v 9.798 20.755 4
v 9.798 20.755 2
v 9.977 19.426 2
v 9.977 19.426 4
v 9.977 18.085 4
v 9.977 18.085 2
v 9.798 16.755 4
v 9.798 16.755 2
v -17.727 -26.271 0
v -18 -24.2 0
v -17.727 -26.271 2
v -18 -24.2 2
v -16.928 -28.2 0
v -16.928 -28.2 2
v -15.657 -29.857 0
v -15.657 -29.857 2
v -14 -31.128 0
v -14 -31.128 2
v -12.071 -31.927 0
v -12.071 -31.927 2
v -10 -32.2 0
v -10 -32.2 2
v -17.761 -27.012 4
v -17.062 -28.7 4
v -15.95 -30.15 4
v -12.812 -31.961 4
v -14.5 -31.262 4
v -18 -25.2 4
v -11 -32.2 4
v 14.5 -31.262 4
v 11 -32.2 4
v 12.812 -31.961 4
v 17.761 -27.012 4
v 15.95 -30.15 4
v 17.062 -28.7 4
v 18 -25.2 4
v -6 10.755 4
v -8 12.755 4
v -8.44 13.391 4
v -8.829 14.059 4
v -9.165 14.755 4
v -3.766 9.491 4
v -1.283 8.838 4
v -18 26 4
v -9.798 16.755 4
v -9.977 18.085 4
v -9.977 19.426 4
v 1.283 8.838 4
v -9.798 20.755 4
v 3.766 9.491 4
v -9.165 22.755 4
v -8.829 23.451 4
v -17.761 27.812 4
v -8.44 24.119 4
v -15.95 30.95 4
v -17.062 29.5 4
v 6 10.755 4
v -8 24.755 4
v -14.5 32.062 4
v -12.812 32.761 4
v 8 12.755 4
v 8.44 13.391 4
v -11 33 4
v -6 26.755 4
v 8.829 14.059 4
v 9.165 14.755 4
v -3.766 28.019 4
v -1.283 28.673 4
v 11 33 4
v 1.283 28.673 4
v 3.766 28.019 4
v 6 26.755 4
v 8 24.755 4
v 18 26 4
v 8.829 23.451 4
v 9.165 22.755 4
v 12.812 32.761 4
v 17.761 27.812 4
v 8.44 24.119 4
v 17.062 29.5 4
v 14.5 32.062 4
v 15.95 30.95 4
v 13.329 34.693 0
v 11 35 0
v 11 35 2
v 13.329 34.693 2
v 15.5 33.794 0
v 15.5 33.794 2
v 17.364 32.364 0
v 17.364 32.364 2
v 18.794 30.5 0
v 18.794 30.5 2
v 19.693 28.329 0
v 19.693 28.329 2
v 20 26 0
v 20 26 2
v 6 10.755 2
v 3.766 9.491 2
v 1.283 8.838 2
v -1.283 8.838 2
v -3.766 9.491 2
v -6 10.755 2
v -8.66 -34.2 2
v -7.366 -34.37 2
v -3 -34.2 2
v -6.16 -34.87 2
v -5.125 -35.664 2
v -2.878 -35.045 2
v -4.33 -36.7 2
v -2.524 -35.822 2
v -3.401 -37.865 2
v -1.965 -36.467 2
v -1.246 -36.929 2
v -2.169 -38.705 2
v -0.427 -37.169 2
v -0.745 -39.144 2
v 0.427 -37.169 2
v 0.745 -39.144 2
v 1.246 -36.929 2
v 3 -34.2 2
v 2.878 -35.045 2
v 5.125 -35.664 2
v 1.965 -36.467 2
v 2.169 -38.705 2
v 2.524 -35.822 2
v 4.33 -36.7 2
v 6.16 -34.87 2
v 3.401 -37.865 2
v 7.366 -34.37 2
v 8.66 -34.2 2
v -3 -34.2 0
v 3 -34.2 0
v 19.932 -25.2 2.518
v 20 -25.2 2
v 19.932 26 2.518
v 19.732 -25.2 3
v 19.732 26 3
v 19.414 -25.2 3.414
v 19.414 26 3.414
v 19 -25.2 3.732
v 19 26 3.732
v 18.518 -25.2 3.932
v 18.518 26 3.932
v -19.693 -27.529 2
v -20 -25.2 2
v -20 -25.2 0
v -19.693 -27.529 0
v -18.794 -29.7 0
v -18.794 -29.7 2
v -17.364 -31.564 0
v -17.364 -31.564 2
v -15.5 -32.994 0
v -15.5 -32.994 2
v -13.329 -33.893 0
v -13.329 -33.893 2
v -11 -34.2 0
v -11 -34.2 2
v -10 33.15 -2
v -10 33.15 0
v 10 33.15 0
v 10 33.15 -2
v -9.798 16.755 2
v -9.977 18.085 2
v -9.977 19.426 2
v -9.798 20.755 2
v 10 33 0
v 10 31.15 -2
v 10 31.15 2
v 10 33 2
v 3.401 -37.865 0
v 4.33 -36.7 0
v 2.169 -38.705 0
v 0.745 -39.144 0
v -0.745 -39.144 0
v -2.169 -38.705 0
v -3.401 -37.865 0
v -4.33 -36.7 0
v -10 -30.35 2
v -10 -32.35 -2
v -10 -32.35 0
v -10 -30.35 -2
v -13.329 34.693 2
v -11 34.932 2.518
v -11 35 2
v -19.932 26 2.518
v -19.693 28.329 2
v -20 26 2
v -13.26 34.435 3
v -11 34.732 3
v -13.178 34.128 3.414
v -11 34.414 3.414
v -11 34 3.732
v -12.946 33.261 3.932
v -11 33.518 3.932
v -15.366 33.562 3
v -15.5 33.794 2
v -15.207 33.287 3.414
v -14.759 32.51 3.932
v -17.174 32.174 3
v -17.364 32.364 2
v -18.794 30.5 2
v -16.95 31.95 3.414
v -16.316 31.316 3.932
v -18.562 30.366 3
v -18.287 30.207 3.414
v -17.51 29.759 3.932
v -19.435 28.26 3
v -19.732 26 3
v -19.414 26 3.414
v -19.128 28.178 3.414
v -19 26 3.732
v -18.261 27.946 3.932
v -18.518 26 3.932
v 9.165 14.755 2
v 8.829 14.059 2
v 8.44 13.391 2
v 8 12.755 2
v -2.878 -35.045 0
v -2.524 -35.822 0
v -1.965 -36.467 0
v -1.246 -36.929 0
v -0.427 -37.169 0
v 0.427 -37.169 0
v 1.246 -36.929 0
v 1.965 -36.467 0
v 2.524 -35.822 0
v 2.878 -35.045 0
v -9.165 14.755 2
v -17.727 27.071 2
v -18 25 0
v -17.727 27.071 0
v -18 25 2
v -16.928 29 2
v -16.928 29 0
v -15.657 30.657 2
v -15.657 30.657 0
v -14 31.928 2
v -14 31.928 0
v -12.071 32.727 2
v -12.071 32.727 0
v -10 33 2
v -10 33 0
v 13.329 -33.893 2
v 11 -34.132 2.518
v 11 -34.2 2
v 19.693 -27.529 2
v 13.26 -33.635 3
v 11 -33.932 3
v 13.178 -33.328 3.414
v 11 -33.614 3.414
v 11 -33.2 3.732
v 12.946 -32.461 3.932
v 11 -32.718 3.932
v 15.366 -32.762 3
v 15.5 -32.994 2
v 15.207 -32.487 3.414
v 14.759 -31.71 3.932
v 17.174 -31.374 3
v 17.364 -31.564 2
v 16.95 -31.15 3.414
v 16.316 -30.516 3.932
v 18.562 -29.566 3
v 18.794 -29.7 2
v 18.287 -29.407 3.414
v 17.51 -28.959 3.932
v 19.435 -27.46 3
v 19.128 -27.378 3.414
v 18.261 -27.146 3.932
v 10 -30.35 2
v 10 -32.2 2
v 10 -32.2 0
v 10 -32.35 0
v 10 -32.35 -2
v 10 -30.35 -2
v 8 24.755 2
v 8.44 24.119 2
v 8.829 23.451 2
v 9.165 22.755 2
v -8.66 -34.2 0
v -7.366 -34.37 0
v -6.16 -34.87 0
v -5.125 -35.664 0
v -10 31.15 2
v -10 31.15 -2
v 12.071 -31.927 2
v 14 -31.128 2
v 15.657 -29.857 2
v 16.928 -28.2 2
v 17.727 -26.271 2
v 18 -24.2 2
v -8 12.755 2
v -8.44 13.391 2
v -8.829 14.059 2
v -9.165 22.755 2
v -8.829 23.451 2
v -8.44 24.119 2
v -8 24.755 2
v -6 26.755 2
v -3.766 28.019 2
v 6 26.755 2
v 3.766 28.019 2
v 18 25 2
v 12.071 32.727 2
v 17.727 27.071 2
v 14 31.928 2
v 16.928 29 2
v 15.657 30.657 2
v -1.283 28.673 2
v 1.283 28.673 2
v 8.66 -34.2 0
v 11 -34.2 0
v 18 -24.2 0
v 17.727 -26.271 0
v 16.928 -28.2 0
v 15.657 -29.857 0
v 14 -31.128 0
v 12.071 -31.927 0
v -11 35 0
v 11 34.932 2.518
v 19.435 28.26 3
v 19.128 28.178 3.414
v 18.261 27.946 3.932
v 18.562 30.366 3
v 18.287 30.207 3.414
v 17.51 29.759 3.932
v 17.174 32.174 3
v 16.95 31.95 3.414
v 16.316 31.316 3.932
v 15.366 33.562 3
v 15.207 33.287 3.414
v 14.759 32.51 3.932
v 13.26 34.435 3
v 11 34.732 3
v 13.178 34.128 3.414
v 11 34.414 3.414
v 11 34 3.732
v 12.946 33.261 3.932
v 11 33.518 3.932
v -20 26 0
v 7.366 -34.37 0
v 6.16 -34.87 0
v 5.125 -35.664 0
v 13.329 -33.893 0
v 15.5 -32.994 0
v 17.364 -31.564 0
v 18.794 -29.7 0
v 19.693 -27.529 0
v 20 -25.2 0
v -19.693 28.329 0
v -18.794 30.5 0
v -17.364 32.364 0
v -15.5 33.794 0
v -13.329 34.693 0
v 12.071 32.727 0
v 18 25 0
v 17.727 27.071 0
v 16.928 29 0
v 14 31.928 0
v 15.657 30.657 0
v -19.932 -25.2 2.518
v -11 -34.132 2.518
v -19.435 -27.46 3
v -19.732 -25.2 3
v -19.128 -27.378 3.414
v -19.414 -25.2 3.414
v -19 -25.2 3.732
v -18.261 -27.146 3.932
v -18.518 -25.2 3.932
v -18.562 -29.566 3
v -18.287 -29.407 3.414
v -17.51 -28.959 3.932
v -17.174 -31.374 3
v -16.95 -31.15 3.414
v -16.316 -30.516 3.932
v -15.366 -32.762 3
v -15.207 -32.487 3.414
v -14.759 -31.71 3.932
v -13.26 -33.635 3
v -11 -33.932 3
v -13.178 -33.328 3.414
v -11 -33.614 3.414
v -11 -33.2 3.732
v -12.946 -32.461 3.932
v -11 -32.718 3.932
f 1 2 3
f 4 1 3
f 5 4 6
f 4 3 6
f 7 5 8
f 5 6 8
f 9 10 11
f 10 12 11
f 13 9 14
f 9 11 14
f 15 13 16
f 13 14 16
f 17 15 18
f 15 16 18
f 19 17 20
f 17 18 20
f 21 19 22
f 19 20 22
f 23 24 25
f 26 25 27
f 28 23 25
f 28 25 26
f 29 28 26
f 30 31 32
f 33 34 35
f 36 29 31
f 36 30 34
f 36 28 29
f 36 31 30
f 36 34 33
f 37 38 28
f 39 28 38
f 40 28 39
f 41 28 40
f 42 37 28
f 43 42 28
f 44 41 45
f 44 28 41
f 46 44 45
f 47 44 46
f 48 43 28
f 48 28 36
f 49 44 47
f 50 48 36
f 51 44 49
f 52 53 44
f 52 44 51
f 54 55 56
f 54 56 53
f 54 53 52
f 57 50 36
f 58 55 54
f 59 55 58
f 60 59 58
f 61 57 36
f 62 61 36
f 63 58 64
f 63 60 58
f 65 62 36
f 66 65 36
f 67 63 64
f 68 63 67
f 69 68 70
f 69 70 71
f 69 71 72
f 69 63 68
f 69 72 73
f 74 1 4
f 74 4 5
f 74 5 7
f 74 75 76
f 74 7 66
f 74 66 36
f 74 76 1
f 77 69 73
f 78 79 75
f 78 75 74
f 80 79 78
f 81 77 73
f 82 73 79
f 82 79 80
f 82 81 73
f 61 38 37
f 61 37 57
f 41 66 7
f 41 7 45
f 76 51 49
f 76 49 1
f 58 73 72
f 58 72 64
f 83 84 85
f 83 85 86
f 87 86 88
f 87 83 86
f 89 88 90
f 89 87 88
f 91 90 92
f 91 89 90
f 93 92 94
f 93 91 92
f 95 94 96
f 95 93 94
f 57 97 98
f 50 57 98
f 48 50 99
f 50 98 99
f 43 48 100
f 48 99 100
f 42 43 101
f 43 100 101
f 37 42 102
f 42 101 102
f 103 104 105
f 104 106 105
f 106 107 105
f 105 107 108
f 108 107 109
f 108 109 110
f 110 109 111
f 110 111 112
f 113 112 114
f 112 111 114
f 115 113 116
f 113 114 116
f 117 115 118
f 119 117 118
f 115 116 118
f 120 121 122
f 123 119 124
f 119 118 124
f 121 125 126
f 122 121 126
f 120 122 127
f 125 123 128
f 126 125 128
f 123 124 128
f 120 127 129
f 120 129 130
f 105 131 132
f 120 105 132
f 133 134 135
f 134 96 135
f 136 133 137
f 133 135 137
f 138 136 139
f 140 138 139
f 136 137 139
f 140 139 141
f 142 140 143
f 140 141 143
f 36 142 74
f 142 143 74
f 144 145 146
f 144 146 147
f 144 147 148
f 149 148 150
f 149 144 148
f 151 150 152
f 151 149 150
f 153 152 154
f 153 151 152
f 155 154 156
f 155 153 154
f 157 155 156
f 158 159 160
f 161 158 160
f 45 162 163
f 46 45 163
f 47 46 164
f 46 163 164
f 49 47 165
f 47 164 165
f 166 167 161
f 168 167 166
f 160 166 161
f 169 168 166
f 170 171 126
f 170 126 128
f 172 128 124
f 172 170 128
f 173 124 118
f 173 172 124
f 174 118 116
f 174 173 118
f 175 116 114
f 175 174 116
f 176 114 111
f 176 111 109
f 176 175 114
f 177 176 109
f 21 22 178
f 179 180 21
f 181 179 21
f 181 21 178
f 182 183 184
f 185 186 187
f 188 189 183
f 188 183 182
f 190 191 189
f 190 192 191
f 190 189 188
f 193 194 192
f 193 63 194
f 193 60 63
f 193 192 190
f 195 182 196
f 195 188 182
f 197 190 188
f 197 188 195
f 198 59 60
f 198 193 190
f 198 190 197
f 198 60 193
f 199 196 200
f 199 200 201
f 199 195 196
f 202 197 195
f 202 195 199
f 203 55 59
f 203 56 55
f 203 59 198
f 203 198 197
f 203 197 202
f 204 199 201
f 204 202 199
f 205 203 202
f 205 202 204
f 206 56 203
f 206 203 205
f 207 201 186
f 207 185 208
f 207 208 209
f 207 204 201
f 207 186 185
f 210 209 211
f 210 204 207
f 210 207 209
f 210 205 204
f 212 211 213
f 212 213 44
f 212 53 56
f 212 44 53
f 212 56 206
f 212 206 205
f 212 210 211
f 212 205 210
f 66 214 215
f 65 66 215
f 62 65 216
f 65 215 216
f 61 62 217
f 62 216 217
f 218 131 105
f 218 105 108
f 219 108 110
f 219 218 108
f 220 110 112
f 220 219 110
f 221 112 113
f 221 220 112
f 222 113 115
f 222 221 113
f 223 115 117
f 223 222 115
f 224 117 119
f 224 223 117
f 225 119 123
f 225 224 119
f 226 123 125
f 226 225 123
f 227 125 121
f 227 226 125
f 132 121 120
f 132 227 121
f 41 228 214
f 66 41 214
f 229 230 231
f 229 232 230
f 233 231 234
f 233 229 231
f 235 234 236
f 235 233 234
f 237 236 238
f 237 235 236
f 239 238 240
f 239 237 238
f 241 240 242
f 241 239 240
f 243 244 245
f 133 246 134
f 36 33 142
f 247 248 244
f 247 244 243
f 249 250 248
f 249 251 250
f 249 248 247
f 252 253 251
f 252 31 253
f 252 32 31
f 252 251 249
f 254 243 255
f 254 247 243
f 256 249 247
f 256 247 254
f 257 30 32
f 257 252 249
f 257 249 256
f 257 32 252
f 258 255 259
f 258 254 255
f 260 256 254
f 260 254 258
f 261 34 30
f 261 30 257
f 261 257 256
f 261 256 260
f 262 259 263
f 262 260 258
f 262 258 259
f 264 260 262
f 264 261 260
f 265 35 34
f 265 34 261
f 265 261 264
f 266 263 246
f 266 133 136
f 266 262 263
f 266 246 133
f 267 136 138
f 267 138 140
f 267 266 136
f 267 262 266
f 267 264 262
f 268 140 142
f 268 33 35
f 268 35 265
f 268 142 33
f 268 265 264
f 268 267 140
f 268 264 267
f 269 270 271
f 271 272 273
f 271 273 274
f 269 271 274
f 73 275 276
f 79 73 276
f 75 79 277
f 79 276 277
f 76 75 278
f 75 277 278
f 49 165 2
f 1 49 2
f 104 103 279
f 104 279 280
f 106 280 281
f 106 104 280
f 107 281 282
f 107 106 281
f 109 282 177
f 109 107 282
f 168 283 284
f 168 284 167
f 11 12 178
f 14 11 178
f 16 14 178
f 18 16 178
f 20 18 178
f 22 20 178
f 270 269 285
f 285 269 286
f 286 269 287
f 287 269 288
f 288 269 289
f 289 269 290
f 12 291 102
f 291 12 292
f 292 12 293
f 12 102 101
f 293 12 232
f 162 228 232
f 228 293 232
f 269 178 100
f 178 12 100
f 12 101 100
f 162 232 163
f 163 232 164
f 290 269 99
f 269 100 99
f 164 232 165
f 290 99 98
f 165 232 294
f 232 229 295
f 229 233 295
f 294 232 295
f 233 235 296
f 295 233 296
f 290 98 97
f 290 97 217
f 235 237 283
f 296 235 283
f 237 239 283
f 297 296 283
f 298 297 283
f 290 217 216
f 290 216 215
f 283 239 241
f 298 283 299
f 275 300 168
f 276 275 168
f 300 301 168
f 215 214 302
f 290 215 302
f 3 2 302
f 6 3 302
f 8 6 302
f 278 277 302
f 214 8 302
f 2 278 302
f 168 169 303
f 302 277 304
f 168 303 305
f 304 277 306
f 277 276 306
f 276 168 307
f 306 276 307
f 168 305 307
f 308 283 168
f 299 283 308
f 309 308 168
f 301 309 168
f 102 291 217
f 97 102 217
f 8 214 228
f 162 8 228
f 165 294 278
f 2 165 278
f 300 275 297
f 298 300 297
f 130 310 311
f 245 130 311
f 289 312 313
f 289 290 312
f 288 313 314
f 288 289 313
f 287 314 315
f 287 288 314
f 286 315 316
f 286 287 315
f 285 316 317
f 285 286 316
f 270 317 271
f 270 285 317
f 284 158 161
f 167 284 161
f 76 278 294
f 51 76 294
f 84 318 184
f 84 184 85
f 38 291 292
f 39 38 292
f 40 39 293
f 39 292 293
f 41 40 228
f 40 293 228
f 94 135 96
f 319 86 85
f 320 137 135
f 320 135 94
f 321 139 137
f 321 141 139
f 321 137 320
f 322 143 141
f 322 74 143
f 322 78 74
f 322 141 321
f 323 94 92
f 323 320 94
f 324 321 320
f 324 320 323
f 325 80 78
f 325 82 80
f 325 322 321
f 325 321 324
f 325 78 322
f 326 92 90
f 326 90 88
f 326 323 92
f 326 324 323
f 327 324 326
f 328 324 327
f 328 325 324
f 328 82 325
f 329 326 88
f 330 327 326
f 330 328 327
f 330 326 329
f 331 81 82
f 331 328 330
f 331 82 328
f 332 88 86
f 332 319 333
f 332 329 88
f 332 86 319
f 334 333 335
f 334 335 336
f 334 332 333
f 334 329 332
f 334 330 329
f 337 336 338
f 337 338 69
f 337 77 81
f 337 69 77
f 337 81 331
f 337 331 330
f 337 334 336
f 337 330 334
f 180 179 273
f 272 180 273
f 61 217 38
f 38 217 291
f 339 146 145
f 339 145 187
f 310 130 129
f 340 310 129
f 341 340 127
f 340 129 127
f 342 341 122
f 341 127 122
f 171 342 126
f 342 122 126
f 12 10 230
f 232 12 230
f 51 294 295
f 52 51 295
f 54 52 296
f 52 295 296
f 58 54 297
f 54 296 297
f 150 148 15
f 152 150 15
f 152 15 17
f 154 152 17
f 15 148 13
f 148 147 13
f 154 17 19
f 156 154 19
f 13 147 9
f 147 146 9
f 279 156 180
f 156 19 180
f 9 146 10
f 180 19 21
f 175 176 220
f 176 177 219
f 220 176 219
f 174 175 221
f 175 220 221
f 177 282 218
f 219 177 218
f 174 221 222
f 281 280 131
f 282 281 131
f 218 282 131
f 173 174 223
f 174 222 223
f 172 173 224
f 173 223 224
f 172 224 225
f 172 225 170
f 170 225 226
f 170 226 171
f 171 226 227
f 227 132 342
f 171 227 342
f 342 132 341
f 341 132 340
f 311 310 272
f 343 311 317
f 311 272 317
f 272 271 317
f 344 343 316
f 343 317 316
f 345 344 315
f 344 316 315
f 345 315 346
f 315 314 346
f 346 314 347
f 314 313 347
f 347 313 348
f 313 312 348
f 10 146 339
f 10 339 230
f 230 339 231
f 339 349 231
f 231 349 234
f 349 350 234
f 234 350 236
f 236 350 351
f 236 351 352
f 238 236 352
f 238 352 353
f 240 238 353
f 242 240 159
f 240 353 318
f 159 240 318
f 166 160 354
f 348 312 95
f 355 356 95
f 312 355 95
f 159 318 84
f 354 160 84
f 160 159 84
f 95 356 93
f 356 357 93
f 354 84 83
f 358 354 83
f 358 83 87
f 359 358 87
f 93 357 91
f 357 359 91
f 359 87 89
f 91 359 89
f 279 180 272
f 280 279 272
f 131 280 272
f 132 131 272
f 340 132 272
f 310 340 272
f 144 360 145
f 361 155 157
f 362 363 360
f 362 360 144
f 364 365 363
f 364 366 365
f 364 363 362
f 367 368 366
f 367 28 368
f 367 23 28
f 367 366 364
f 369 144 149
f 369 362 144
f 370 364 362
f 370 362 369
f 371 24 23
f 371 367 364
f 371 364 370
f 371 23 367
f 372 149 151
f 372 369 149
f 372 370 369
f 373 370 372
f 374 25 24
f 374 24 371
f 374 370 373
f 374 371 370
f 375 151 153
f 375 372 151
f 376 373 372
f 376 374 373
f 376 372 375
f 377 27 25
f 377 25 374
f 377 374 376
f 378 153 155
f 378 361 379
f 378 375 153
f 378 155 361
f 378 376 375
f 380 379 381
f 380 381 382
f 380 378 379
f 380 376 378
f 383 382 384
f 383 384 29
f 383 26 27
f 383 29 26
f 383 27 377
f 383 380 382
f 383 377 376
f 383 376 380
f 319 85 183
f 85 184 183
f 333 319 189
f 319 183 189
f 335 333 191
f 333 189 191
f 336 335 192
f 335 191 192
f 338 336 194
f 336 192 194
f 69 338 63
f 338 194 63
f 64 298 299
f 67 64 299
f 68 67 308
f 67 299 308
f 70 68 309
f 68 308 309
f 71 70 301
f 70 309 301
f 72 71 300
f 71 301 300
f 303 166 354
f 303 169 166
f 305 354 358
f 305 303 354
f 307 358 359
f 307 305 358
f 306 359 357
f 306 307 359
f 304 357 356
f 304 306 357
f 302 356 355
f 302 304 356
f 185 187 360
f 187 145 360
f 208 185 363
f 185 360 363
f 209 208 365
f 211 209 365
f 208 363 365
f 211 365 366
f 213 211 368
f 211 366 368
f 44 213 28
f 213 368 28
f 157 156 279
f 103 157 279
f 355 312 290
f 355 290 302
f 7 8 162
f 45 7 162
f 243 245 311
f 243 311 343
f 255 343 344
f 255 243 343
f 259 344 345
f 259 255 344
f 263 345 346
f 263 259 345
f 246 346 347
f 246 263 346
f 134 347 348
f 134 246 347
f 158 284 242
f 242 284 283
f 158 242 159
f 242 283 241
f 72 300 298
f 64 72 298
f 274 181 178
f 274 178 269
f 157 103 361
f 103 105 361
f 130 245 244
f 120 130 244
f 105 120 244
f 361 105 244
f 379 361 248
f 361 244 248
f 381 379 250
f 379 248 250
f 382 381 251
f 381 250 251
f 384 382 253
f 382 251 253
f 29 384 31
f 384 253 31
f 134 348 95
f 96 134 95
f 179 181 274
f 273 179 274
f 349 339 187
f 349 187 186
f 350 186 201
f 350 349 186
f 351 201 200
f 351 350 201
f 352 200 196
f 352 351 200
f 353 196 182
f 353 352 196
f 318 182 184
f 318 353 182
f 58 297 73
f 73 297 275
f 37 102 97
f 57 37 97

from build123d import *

# Parameters (mm, degrees)
F0_W      = 40
F0_H      = 69.2
F0_W_2    = 36
F0_H_2    = 65.2
F1_DEPTH  = 2
F2_W      = 20
F2_H      = 2
F3_DEPTH  = 2
F4_W      = 40
F4_H      = 69.2
F5_DEPTH  = 2
F6_R      = 7.99999
F7_R      = 9
F8_R      = 2
F10_DEPTH = 2
F11_R     = 5


# Not quite as in the source:
# - a fillet or chamfer is up to 0.001 mm smaller than in the source, because OpenCascade refuses the exact size


with BuildPart() as f1:
    # F0 (on Top) → F1 (new body)
    with BuildSketch(Plane.XY):
        with Locations((0, 0.4)):
            Rectangle(F0_W, F0_H)
        with Locations((0, 0.4)):
            Rectangle(F0_W_2, F0_H_2, mode=Mode.SUBTRACT)
    extrude(amount=F1_DEPTH)

    # F2 (on Top) → F3 (join, symmetric)
    with BuildSketch(Plane.XY):
        with Locations((0, -31.35)):
            Rectangle(F2_W, F2_H)
        with Locations((0, 32.15)):
            Rectangle(F2_W, F2_H)
    extrude(amount=F3_DEPTH, both=True)

    # F4 (on face) → F5 (join)
    with BuildSketch(Plane.XY.offset(2)):
        with Locations((0, 0.4)):
            Rectangle(F4_W, F4_H)
        with BuildLine():
            ThreePointArc((6, 10.7552776188), (0, 8.7552776188), (-6, 10.7552776188))
            Line((-6, 10.7552776188), (6, 10.7552776188))
        make_face(mode=Mode.SUBTRACT)
        with BuildLine():
            ThreePointArc((-8, 12.7552776188), (-8.6406368723, 13.721452588), (-9.1651513899, 14.7552776188))
            Line((-9.1651513899, 14.7552776188), (9.1651513899, 14.7552776188))
            ThreePointArc((9.1651513899, 14.7552776188), (8.6406368723, 13.721452588), (8, 12.7552776188))
            Line((8, 12.7552776188), (-8, 12.7552776188))
        make_face(mode=Mode.SUBTRACT)
        with BuildLine():
            Line((9.7979589711, 16.7552776188), (-9.7979589711, 16.7552776188))
            ThreePointArc((-9.7979589711, 16.7552776188), (-10, 18.7552776188), (-9.7979589711, 20.7552776188))
            Line((-9.7979589711, 20.7552776188), (9.7979589711, 20.7552776188))
            ThreePointArc((9.7979589711, 20.7552776188), (10, 18.7552776188), (9.7979589711, 16.7552776188))
        make_face(mode=Mode.SUBTRACT)
        with BuildLine():
            Line((9.1651513899, 22.7552776188), (-9.1651513899, 22.7552776188))
            ThreePointArc((-9.1651513899, 22.7552776188), (-8.6406368723, 23.7891026495), (-8, 24.7552776188))
            Line((-8, 24.7552776188), (8, 24.7552776188))
            ThreePointArc((8, 24.7552776188), (8.6406368723, 23.7891026495), (9.1651513899, 22.7552776188))
        make_face(mode=Mode.SUBTRACT)
        with BuildLine():
            Line((6, 26.7552776188), (-6, 26.7552776188))
            ThreePointArc((-6, 26.7552776188), (0, 28.7552776188), (6, 26.7552776188))
        make_face(mode=Mode.SUBTRACT)
    extrude(amount=F5_DEPTH)

    # F6 (radius 8 in the source; OpenCascade refuses exactly that, so slightly less here)
    f6_edges = [f1.edges().sort_by_distance(p)[0] for p in [
        (18, 33, 1),
        (-18, 33, 1),
        (18, -32.2, 1),
        (-18, -32.2, 1),
    ]]
    fillet(f6_edges, radius=F6_R)

    # F7
    f7_edges = [f1.edges().sort_by_distance(p)[0] for p in [
        (-20, -34.2, 2),
        (-20, 35, 2),
        (20, 35, 2),
        (20, -34.2, 2),
    ]]
    fillet(f7_edges, radius=F7_R)

    # F8
    f8_edges = [f1.edges().sort_by_distance(p)[0] for p in [
        (20, 0.4, 4),
    ]]
    fillet(f8_edges, radius=F8_R)

    # F9 (on face) → F10 (join)
    with BuildSketch(Plane(origin=(0, 0, 0), x_dir=(1, 0, 0), z_dir=(0, 0, -1))):
        with BuildLine():
            Line((3, 34.2), (5, 34.2))
            ThreePointArc((5, 34.2), (0, 39.2), (-5, 34.2))
            Line((-5, 34.2), (-3, 34.2))
            ThreePointArc((-3, 34.2), (0, 37.2), (3, 34.2))
        make_face()
    extrude(amount=-F10_DEPTH)

    # F11
    f11_edges = [f1.edges().sort_by_distance(p)[0] for p in [
        (-5, -34.2, 1),
        (5, -34.2, 1),
    ]]
    fillet(f11_edges, radius=F11_R)


solid = f1.part
